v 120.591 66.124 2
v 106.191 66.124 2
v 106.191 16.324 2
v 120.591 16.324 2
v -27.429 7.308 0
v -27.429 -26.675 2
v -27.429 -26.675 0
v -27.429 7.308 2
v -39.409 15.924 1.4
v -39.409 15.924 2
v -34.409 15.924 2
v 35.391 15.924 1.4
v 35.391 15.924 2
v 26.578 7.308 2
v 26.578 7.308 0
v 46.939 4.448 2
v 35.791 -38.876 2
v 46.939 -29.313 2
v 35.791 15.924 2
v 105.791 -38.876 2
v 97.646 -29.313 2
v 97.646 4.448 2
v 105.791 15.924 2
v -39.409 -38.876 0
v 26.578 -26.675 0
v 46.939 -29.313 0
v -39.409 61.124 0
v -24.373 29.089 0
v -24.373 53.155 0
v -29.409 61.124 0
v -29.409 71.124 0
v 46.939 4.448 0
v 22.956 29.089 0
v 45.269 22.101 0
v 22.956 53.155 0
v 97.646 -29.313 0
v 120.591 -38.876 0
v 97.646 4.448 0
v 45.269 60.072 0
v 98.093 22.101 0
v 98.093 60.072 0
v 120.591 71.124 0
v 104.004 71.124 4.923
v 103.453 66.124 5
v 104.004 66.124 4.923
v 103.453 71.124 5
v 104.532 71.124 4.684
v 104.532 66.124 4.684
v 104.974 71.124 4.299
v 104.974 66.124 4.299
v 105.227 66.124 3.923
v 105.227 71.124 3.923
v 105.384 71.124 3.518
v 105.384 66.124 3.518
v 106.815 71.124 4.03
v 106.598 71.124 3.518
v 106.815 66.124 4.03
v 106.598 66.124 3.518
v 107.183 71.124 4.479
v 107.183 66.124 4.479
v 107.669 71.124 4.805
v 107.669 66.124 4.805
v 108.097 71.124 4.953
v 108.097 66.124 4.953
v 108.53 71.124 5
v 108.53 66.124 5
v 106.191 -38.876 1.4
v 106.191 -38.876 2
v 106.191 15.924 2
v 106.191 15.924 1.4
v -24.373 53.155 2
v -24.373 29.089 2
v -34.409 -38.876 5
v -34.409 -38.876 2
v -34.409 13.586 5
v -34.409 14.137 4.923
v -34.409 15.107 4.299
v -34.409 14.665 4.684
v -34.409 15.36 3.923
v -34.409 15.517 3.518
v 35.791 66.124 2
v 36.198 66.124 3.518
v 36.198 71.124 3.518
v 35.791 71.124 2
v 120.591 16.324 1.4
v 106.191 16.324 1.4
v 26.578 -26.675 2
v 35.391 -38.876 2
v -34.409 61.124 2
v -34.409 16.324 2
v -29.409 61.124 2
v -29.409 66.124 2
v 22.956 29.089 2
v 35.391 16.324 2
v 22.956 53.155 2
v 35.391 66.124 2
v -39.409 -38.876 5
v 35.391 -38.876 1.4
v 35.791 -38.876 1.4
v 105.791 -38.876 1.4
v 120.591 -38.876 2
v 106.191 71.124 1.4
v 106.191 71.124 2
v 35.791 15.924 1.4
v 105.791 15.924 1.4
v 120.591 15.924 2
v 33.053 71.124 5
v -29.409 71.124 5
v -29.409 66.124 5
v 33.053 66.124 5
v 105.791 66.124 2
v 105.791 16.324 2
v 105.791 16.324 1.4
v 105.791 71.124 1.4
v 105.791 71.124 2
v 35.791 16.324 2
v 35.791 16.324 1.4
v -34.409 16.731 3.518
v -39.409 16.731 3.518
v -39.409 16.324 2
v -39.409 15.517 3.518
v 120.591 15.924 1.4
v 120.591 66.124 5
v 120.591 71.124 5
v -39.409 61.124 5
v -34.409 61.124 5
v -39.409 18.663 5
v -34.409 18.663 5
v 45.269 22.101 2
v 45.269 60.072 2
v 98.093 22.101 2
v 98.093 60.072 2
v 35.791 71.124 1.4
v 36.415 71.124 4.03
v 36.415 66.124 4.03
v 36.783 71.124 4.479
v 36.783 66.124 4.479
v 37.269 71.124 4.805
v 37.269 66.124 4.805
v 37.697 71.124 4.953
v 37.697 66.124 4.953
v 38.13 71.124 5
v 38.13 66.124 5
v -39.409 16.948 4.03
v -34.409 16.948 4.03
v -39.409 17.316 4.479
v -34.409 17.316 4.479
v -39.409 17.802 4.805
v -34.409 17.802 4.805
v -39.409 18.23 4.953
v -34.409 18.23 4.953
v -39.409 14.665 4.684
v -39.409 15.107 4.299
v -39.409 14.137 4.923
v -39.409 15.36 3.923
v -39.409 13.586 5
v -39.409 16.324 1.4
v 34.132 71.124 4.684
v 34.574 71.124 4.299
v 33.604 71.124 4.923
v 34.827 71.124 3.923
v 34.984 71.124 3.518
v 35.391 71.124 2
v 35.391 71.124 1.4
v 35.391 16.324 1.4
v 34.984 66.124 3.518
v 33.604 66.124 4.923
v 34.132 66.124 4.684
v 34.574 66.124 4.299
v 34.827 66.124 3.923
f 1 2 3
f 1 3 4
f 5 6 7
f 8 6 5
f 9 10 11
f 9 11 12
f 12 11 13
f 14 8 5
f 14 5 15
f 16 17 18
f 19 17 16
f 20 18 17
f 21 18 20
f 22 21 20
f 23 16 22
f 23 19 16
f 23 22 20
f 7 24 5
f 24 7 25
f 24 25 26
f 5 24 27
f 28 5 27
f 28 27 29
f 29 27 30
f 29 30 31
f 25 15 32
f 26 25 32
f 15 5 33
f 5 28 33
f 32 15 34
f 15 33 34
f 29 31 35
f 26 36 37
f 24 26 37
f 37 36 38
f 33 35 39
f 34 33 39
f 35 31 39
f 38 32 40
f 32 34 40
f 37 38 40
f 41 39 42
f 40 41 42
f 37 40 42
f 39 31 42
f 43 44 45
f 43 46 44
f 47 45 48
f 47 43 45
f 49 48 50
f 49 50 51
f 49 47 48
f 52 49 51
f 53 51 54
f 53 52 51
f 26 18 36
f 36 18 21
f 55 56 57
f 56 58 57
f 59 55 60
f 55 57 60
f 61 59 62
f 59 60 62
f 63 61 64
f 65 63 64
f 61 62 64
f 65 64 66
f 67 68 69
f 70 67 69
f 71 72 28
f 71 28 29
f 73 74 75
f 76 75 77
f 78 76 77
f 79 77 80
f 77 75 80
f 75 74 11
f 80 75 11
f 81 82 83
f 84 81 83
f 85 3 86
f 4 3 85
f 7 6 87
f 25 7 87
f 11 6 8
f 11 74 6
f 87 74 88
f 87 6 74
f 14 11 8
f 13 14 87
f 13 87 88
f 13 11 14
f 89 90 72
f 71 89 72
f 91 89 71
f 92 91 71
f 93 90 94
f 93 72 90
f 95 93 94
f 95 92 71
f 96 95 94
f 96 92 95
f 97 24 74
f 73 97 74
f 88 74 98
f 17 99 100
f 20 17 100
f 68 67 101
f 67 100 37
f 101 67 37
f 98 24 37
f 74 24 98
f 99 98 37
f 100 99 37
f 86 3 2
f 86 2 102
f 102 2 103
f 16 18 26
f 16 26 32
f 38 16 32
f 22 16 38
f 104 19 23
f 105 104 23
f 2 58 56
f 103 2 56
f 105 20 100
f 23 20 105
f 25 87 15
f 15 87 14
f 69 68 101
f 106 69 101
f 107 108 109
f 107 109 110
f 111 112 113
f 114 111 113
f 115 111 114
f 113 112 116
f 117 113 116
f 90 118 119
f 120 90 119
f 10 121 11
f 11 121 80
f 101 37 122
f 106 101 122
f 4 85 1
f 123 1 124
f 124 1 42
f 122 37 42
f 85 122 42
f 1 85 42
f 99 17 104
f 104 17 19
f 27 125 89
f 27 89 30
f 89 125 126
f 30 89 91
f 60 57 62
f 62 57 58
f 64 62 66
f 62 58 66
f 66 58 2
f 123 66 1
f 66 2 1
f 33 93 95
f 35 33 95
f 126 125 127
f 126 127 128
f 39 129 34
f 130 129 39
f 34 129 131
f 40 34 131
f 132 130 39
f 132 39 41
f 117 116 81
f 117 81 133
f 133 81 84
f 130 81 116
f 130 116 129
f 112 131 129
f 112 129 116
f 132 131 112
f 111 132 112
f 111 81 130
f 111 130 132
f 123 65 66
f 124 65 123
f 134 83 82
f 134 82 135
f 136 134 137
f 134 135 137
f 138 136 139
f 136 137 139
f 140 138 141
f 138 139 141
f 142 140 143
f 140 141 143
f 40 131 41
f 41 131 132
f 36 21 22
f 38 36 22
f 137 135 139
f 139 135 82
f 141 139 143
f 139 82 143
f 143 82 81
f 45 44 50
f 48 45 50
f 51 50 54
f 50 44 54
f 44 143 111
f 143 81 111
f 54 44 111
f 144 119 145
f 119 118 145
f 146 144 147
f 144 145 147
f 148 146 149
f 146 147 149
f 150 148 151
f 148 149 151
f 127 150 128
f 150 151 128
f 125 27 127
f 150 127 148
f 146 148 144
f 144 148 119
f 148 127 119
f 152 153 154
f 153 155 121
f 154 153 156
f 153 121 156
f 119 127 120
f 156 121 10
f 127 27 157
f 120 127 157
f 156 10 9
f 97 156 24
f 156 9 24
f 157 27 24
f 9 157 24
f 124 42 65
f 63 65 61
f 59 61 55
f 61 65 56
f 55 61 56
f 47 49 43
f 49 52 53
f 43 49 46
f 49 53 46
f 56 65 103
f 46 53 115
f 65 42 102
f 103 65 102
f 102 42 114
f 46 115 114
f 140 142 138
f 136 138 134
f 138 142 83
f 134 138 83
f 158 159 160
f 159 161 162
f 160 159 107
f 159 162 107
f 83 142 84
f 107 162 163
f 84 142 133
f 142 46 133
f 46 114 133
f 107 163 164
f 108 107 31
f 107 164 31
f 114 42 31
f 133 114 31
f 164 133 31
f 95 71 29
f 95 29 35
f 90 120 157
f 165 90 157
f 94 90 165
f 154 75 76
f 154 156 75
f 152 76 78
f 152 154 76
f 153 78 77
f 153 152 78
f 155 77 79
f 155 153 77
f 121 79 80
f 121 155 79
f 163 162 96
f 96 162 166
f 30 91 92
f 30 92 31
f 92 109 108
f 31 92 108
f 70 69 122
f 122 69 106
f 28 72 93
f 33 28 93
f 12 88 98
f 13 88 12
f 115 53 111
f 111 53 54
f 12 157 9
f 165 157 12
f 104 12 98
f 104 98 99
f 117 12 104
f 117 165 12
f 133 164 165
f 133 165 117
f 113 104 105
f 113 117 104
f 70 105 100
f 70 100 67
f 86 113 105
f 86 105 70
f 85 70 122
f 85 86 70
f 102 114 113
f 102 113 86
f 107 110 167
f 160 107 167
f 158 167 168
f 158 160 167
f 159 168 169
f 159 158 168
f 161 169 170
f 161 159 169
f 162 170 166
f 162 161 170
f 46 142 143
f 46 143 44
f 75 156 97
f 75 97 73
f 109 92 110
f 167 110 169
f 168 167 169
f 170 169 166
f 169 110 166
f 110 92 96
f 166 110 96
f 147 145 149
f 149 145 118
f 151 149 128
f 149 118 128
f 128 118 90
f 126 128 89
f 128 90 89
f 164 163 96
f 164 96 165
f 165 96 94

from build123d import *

# Parameters (mm, degrees)
F0_W     = 160
F0_H     = 110
F1_DEPTH = 2
F2_W     = 155
F2_H     = 5
F3_DEPTH = 3
F4_W     = 0.4
F4_H     = 100.6983700028
F4_H_2   = 0.4
F4_W_2   = 91.7048521668
F4_W_3   = 70
F4_H_3   = 101.3179807599
F4_H_4   = 104.9661831624
F4_H_5   = 97.0501676003
F4_W_4   = 42.9082732886
F5_DEPTH = 0.6
F6_DEPTH = 4
F6_TAPER = -15
F7_R     = 2
F8_W     = 10
F8_H     = 10
F8_W_2   = 47.3290588707
F8_H_2   = 24.0664053708
F8_W_3   = 54.0067385882
F8_H_3   = 33.9830359444
F8_W_4   = 52.8240427375
F8_H_4   = 37.9707552493
F8_W_5   = 50.7075823843
F8_H_5   = 33.7607157417
F9_DEPTH = 25


with BuildPart() as f1:
    # F0 (on Top) → F1 (new body)
    with BuildSketch(Plane.XY):
        with Locations((40.5911064893, 16.1241146261)):
            Rectangle(F0_W, F0_H)
    extrude(amount=F1_DEPTH)

    # F2 (on face) → F3 (join)
    with BuildSketch(Plane.XY.offset(2)):
        Polygon((-34.4088935107, 71.1241146261), (-39.4088935107, 71.1241146261), (-39.4088935107, -38.8758853739), (-34.4088935107, -38.8758853739), (-34.4088935107, 66.1241146261), align=None)
        with Locations((43.0911064893, 68.6241146261)):
            Rectangle(F2_W, F2_H)
    extrude(amount=F3_DEPTH)

    # F4 (on face) → F5 (cut)
    with BuildSketch(Plane.XY.offset(2)):
        with Locations((35.5911064893, 66.6732996275)):
            Rectangle(F4_W, F4_H)
        with Locations((35.5911064893, 16.1241146261)):
            Rectangle(F4_W, F4_H_2)
        with Locations((-10.4613195941, 16.1241146261)):
            Rectangle(F4_W_2, F4_H_2)
        with Locations((70.7911064893, 16.1241146261)):
            Rectangle(F4_W_3, F4_H_2)
        with Locations((35.5911064893, -34.7348757538)):
            Rectangle(F4_W, F4_H_3)
        with Locations((105.9911064893, 16.1241146261)):
            Rectangle(F4_W, F4_H_2)
        with Locations((105.9911064893, 68.8072062073)):
            Rectangle(F4_W, F4_H_4)
        with Locations((105.9911064893, -32.600969174)):
            Rectangle(F4_W, F4_H_5)
        with Locations((127.6452431336, 16.1241146261)):
            Rectangle(F4_W_4, F4_H_2)
    extrude(amount=-F5_DEPTH, mode=Mode.SUBTRACT)

    # F4 (on face) → F6 (cut)
    with BuildSketch(Plane.XY.offset(2)):
        with Locations((35.5911064893, 66.6732996275)):
            Rectangle(F4_W, F4_H)
        with Locations((35.5911064893, 16.1241146261)):
            Rectangle(F4_W, F4_H_2)
        with Locations((-10.4613195941, 16.1241146261)):
            Rectangle(F4_W_2, F4_H_2)
        with Locations((70.7911064893, 16.1241146261)):
            Rectangle(F4_W_3, F4_H_2)
        with Locations((35.5911064893, -34.7348757538)):
            Rectangle(F4_W, F4_H_3)
        with Locations((105.9911064893, 16.1241146261)):
            Rectangle(F4_W, F4_H_2)
        with Locations((105.9911064893, 68.8072062073)):
            Rectangle(F4_W, F4_H_4)
        with Locations((105.9911064893, -32.600969174)):
            Rectangle(F4_W, F4_H_5)
        with Locations((127.6452431336, 16.1241146261)):
            Rectangle(F4_W_4, F4_H_2)
    extrude(amount=F6_DEPTH, taper=F6_TAPER, mode=Mode.SUBTRACT)

    # F7
    f7_edges = [f1.edges().sort_by_distance(p)[0] for p in [
        (-36.908894, 17.127962, 5),
        (-36.908894, 15.120267, 5),
        (34.587259, 68.624115, 5),
        (36.594954, 68.624115, 5),
        (106.994954, 68.624115, 5),
        (104.987259, 68.624115, 5),
    ]]
    fillet(f7_edges, radius=F7_R)

    # F8 (on face) → F9 (cut)
    with BuildSketch(Plane.XY.offset(5)):
        with Locations((-34.4088935107, 66.1241146261)):
            Rectangle(F8_W, F8_H)
        with Locations((-0.7081469521, 41.1217464134)):
            Rectangle(F8_W_2, F8_H_2)
        with Locations((-0.4255371168, -9.683905635)):
            Rectangle(F8_W_3, F8_H_3)
        with Locations((71.6814361513, 41.0866308957)):
            Rectangle(F8_W_4, F8_H_4)
        with Locations((72.29234837, -12.4325060751)):
            Rectangle(F8_W_5, F8_H_5)
    extrude(amount=-F9_DEPTH, mode=Mode.SUBTRACT)


solid = f1.part
